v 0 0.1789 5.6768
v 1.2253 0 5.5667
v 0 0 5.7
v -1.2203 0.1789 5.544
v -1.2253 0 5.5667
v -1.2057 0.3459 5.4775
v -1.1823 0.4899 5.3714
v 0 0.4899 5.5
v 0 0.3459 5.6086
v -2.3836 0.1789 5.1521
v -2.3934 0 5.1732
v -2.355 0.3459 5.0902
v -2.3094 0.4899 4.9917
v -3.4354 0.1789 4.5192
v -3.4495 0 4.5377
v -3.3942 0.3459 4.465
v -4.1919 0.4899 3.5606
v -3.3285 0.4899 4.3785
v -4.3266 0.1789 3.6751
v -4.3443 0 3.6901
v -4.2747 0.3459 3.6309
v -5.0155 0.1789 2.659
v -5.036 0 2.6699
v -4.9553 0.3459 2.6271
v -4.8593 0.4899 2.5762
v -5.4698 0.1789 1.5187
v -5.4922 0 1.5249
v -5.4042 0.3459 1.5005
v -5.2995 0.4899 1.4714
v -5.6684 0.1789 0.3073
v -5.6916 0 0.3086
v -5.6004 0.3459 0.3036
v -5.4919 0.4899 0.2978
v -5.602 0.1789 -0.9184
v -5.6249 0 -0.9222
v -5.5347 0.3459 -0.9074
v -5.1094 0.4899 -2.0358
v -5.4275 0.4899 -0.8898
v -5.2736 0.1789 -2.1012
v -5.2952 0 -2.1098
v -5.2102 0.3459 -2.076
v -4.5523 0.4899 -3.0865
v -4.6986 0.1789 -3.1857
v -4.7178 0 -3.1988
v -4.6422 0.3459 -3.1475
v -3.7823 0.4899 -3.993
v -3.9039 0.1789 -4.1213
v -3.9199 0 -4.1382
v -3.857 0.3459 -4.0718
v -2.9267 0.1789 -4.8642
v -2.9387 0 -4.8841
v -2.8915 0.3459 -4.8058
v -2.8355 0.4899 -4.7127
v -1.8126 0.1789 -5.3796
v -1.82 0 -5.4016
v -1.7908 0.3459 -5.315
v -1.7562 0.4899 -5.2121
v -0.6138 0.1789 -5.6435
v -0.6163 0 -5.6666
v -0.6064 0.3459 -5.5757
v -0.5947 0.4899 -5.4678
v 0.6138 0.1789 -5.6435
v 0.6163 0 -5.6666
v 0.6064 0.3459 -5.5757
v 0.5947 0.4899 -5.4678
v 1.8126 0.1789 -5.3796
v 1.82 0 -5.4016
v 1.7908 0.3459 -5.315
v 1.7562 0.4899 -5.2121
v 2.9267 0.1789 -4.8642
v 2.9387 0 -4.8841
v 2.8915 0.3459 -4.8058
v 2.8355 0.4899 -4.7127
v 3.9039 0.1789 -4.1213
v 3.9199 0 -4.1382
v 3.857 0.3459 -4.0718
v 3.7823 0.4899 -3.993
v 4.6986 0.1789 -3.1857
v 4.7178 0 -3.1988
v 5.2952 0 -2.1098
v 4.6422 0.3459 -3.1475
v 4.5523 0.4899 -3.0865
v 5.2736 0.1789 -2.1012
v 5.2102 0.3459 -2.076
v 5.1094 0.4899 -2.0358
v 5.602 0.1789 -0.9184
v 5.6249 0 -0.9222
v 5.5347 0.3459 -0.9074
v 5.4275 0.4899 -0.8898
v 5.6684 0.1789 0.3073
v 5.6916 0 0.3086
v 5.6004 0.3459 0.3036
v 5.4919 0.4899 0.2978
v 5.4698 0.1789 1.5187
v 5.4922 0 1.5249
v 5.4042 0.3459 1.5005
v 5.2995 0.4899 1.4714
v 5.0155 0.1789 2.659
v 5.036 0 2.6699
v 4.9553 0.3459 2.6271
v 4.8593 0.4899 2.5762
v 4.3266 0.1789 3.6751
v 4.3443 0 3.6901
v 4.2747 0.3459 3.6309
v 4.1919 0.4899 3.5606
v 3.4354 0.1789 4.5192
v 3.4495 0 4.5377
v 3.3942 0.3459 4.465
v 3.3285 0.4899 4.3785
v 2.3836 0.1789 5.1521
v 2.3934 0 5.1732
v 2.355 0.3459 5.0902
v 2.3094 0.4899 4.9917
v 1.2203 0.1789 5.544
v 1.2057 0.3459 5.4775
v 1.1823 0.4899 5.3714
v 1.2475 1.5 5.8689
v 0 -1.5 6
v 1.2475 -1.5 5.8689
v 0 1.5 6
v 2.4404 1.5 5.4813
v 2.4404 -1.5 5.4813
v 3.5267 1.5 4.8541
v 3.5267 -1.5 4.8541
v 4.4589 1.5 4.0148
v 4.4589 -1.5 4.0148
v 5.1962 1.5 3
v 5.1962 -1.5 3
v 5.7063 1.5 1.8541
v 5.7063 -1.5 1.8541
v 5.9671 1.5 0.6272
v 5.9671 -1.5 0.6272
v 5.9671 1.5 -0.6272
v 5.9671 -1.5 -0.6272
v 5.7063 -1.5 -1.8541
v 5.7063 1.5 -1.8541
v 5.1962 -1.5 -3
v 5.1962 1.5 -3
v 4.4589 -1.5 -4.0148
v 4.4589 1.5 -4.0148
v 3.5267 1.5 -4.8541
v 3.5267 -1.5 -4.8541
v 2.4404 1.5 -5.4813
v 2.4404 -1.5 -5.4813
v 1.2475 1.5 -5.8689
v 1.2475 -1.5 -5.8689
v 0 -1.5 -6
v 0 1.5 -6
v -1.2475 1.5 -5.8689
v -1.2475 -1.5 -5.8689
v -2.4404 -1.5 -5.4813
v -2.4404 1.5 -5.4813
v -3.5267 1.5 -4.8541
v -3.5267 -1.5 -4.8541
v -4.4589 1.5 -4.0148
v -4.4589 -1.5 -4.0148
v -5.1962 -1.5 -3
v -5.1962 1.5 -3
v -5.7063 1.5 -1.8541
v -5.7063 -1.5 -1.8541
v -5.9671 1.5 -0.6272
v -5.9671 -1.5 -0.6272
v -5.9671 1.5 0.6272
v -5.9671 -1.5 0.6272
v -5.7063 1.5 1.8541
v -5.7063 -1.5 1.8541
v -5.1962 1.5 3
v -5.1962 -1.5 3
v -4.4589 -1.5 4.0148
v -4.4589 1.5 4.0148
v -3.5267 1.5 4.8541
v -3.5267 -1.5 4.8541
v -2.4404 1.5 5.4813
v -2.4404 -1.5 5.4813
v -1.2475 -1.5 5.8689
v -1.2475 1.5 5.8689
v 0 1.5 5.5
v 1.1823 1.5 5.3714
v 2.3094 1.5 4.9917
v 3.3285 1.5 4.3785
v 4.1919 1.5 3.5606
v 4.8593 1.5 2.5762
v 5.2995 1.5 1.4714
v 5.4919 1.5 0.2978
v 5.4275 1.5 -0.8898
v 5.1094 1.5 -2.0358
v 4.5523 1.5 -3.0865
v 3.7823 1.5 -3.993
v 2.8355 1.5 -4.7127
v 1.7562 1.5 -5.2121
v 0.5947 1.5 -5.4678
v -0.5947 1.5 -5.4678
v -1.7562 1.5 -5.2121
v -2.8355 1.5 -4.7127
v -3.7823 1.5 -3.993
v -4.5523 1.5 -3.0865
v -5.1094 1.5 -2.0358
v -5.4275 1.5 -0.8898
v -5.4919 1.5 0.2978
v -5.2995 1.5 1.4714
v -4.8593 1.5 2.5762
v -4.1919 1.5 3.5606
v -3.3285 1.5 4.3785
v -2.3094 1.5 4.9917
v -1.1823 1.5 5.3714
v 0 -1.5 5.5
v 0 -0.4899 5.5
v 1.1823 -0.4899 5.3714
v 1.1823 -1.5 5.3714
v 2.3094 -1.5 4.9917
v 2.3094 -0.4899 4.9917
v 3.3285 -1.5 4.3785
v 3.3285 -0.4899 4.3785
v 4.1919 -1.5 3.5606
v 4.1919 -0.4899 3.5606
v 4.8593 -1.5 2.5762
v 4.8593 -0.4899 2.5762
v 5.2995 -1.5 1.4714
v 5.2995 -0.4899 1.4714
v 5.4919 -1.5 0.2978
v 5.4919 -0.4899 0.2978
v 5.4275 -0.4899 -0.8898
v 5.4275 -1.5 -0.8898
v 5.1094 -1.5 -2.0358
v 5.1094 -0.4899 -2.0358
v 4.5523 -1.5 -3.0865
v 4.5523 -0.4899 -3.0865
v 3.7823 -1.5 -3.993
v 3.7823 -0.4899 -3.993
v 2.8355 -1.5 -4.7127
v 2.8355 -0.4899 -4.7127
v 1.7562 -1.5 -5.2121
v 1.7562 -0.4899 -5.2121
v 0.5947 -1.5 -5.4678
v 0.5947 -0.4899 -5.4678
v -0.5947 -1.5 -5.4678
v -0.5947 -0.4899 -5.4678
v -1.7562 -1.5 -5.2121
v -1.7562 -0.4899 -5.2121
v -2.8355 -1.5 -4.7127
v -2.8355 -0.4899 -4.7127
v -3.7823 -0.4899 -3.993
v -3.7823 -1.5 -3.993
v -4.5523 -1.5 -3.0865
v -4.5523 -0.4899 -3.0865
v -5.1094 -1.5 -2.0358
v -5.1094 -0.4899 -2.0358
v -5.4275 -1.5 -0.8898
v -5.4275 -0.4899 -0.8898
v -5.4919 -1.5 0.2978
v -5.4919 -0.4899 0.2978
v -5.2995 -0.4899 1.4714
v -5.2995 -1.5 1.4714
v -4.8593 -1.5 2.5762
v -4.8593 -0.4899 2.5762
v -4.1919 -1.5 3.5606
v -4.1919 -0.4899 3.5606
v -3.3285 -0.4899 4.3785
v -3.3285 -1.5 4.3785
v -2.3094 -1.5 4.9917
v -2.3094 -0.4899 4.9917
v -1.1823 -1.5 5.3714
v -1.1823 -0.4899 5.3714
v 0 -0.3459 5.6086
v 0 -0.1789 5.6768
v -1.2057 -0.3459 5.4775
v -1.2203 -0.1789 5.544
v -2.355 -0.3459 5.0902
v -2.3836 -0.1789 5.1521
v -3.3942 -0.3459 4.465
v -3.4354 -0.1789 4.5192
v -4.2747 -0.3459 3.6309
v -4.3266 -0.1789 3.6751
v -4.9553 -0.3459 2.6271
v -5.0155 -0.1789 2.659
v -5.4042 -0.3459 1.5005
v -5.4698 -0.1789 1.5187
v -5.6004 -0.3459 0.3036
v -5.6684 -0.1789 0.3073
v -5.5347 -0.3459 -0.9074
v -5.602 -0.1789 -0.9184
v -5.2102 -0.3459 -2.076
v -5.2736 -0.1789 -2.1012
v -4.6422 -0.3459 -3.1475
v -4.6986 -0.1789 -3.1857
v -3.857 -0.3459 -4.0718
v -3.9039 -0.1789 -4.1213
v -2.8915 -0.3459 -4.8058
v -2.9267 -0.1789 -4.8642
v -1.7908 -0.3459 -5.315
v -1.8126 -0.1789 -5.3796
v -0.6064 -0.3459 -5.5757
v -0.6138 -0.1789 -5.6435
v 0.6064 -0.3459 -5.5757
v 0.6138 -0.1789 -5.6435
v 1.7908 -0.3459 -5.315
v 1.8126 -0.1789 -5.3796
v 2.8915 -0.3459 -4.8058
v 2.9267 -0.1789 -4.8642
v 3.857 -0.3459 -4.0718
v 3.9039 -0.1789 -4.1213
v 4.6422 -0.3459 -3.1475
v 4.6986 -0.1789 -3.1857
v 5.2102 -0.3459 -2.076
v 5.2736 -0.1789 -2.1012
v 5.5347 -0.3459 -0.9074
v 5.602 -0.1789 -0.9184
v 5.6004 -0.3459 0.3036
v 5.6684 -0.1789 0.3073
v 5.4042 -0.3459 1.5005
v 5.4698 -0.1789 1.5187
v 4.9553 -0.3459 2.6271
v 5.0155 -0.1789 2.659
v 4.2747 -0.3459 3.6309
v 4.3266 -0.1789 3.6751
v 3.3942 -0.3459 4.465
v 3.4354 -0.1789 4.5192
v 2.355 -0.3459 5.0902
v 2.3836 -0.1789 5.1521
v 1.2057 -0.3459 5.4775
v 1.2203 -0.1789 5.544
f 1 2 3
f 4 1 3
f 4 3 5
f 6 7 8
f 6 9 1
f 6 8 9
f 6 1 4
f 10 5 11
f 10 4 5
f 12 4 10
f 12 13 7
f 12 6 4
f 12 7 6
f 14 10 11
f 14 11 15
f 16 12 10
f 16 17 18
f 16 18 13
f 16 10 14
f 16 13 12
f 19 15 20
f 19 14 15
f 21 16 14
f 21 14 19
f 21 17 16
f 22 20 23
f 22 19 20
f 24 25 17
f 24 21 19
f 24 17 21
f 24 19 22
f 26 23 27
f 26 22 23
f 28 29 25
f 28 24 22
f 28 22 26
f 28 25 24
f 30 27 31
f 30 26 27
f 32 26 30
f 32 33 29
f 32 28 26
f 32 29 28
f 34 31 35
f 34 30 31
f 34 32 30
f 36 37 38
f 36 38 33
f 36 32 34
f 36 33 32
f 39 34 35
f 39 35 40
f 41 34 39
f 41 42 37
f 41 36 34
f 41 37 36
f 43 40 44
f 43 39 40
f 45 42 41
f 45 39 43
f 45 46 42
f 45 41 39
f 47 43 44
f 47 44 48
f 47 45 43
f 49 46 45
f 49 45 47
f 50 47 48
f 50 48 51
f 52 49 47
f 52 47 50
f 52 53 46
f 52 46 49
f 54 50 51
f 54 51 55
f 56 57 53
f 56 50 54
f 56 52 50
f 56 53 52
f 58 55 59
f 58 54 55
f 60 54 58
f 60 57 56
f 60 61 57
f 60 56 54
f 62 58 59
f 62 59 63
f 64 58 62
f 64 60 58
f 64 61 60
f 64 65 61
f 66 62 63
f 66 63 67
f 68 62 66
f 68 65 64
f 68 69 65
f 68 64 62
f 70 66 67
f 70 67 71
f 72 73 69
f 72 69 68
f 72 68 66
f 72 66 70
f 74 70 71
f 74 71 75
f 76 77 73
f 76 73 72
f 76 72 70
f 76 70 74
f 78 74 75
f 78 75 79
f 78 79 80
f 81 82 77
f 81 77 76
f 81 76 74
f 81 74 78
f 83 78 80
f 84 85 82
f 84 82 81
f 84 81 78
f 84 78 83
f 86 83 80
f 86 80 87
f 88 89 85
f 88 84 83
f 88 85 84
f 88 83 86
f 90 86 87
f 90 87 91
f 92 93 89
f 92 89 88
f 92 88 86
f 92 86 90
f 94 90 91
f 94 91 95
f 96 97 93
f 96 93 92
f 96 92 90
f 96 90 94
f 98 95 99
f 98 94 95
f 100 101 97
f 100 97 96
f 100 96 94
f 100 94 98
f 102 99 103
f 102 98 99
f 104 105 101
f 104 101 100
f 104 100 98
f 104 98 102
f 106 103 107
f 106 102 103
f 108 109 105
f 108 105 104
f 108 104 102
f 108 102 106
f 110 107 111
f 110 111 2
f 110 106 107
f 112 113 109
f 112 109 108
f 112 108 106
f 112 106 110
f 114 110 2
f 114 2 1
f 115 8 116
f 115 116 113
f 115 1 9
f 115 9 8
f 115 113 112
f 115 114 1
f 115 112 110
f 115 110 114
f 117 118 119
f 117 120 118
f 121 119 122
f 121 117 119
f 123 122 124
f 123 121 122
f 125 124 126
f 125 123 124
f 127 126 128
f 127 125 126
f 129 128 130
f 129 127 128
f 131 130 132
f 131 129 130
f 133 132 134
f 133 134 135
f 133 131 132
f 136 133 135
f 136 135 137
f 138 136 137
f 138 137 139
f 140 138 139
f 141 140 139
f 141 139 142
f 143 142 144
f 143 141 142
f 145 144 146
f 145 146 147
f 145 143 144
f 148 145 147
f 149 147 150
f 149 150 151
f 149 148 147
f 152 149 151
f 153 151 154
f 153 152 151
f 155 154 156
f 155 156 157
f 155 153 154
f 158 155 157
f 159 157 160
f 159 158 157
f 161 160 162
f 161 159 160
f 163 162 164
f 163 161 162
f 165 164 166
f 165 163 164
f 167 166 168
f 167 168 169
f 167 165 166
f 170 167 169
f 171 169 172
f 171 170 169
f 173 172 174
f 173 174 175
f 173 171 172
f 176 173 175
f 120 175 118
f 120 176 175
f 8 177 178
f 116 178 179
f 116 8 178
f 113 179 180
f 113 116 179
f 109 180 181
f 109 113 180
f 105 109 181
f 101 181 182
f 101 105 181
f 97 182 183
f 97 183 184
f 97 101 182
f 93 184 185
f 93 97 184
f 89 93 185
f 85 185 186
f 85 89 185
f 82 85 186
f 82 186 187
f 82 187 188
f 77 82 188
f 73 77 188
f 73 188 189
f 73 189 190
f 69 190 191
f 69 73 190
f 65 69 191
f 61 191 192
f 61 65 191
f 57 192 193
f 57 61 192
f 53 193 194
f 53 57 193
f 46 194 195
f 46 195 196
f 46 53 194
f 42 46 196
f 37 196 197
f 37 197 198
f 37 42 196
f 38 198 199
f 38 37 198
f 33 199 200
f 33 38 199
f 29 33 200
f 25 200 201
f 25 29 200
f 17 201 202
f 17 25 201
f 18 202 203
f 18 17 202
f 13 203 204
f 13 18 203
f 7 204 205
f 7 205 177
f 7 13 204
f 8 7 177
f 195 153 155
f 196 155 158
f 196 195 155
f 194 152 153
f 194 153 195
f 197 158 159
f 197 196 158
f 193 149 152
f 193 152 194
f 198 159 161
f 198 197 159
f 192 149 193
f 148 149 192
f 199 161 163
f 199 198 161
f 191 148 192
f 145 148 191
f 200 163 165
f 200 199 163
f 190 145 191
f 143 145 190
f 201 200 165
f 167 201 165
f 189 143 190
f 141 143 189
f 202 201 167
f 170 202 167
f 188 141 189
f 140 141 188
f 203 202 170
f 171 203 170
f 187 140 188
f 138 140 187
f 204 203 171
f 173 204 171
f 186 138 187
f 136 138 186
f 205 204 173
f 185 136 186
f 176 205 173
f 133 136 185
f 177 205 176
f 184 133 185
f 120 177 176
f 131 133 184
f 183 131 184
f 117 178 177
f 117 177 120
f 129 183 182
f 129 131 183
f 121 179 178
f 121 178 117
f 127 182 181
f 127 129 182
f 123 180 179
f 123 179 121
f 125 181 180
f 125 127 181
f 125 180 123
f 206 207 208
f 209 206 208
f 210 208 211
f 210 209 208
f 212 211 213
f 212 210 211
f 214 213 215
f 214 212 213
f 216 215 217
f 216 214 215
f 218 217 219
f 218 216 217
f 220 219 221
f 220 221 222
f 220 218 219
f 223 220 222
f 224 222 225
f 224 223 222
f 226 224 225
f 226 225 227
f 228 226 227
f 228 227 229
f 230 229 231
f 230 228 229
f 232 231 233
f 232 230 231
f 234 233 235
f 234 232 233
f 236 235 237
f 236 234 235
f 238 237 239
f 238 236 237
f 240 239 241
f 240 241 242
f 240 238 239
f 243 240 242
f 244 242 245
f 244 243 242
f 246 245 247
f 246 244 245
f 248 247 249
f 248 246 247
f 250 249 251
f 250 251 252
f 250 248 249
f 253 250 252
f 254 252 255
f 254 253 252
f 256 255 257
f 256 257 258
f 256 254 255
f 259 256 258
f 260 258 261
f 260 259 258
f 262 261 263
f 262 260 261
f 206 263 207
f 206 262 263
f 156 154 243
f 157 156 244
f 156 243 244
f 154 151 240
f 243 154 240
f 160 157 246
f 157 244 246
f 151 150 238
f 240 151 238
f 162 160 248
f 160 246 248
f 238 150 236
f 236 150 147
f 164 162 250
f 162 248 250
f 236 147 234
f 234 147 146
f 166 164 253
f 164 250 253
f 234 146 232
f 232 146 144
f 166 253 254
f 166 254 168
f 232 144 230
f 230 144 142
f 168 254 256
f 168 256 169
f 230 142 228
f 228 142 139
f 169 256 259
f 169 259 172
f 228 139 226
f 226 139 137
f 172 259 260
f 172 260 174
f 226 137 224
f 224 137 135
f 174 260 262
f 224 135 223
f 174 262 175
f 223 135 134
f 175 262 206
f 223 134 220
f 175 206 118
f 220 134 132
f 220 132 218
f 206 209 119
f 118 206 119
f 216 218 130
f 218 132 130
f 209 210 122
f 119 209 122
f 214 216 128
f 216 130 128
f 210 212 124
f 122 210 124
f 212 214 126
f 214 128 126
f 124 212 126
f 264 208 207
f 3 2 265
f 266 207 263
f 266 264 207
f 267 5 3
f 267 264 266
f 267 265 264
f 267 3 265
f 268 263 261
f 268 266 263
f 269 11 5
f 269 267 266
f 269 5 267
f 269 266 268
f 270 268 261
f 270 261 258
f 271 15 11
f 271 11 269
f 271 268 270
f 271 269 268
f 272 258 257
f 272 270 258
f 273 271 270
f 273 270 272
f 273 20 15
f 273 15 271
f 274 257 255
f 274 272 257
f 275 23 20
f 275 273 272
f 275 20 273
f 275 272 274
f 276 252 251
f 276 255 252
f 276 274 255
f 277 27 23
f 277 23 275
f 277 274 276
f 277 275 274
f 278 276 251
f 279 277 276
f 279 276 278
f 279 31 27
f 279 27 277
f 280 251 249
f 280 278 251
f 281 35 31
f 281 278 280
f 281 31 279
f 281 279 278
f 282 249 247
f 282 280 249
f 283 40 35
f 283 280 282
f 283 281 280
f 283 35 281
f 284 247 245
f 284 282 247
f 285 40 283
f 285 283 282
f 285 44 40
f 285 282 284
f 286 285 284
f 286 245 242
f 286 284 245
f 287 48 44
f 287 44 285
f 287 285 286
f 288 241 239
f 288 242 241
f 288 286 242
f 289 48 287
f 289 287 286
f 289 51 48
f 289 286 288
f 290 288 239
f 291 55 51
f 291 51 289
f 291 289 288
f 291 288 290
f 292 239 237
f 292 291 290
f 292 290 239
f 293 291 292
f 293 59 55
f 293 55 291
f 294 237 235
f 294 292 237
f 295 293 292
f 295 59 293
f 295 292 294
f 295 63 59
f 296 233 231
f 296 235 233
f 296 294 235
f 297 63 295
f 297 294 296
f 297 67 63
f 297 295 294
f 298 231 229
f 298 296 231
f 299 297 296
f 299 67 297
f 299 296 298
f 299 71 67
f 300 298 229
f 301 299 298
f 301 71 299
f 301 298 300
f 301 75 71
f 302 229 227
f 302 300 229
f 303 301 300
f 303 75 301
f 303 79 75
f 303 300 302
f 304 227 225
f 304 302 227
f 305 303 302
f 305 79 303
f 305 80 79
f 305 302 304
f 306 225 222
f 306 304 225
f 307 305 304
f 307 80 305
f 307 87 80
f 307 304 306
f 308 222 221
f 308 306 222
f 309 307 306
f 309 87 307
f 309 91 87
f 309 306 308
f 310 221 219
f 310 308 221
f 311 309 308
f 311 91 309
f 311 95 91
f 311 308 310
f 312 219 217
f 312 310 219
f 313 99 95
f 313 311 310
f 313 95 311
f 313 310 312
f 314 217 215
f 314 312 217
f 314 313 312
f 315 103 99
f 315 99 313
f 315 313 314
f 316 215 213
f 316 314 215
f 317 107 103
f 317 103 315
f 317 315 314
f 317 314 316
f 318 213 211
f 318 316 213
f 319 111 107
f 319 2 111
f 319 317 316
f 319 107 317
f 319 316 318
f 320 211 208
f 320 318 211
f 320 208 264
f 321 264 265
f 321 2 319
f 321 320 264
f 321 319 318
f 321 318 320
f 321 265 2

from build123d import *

# Parameters (mm, degrees)
DIAPROFILES_R         = 6
DIAPROFILES_R_2       = 5.5
DIAPROFILE_DEPTH      = 1.5
BEARINGPATHPROFILES_R = 0.7


with BuildPart() as part:
    # DiaProfileS → DiaProfile (new, symmetric)
    with BuildSketch(Plane(origin=(0, 0, 0), x_dir=(1, 0, 0), z_dir=(0, 1, 0))):
        with Locations(Location((0, 0, 0), (0, 0, 270))):
            Circle(DIAPROFILES_R)
        with Locations(Location((0, 0, 0), (0, 0, 270))):
            Circle(DIAPROFILES_R_2, mode=Mode.SUBTRACT)
    extrude(amount=DIAPROFILE_DEPTH, both=True)

    # BearingPathProfileS → BearingPathProfile (revolve, cut)
    with BuildSketch(Plane.XY, mode=Mode.PRIVATE) as bearingpathprofile_sk:
        with Locations((5, 0)):
            Circle(BEARINGPATHPROFILES_R)
    revolve(bearingpathprofile_sk.sketch.rotate(Axis((0, 1.5, 0), (0, -1, 0)), 90), axis=Axis((0, 1.5, 0), (0, -1, 0)), mode=Mode.SUBTRACT)


solid = part.part
